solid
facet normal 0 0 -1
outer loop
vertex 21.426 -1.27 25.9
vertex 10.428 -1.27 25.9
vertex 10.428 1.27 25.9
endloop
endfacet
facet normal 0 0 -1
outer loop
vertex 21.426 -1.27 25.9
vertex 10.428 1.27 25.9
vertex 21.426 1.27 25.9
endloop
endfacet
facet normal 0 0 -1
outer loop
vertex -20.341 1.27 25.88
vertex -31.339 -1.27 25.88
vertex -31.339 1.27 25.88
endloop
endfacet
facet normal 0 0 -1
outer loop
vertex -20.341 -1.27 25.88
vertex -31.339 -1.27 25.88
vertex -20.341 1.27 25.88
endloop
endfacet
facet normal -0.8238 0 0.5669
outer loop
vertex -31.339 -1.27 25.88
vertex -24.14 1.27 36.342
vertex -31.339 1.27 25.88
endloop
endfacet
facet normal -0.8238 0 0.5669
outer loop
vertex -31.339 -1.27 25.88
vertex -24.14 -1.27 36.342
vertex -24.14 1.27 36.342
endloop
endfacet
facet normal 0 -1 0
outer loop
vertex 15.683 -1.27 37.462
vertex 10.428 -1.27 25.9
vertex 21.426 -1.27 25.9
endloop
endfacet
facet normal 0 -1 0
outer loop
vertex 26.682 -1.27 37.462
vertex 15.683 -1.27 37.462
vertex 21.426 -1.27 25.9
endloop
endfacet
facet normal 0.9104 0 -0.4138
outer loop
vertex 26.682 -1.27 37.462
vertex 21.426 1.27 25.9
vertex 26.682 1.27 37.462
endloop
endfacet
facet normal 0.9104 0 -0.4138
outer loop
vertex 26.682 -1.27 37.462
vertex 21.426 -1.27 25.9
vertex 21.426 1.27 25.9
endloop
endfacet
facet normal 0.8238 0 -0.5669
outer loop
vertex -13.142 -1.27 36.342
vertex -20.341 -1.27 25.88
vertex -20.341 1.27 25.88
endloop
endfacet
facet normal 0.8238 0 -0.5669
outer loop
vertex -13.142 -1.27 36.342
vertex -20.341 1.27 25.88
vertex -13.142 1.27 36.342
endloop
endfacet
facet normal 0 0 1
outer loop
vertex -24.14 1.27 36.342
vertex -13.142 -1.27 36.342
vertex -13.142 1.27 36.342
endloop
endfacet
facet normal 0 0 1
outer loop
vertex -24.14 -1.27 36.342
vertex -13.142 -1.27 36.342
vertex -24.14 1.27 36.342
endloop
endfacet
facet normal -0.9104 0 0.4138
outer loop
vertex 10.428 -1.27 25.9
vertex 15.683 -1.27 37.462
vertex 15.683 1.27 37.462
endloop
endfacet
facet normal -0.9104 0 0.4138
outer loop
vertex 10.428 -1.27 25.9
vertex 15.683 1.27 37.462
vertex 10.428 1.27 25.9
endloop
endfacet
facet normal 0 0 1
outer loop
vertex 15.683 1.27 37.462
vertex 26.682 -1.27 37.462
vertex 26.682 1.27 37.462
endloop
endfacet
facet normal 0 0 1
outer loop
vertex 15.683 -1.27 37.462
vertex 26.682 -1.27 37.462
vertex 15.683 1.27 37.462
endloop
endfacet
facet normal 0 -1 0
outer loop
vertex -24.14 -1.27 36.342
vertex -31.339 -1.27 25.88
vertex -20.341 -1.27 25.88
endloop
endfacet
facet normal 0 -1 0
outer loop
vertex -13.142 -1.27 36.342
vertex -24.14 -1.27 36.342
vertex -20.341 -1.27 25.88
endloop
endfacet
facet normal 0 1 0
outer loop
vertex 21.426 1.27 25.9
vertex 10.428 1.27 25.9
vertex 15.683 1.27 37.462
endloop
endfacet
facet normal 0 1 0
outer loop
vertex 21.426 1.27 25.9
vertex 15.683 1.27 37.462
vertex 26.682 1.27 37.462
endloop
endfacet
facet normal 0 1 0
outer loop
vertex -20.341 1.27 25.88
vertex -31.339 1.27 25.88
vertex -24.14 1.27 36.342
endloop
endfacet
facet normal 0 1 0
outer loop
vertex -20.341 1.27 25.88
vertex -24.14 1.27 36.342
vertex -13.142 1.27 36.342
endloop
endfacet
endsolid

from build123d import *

# Parameters (mm, degrees)
F2_DEPTH = 1.27
F3_DEPTH = 1.27


with BuildPart() as f2:
    # F0 (on Front) → F2 (new body, symmetric)
    with BuildSketch(Plane.XZ):
        Polygon((-24.1398429819, 36.3422582364), (-31.3389899048, 25.8798357835), (-20.3407899048, 25.8798357835), (-13.1416429819, 36.3422582364), align=None)
    extrude(amount=F2_DEPTH, both=True)


with BuildPart() as f3:
    # F1 (on Front) → F3 (new body, symmetric)
    with BuildSketch(Plane.XZ):
        Polygon((26.6816595895, 37.4615788128), (15.6834595895, 37.4615788128), (10.4281619181, 25.8999246757), (21.4263619181, 25.8999246757), align=None)
    extrude(amount=F3_DEPTH, both=True)


solid = Compound([f2.part, f3.part])
